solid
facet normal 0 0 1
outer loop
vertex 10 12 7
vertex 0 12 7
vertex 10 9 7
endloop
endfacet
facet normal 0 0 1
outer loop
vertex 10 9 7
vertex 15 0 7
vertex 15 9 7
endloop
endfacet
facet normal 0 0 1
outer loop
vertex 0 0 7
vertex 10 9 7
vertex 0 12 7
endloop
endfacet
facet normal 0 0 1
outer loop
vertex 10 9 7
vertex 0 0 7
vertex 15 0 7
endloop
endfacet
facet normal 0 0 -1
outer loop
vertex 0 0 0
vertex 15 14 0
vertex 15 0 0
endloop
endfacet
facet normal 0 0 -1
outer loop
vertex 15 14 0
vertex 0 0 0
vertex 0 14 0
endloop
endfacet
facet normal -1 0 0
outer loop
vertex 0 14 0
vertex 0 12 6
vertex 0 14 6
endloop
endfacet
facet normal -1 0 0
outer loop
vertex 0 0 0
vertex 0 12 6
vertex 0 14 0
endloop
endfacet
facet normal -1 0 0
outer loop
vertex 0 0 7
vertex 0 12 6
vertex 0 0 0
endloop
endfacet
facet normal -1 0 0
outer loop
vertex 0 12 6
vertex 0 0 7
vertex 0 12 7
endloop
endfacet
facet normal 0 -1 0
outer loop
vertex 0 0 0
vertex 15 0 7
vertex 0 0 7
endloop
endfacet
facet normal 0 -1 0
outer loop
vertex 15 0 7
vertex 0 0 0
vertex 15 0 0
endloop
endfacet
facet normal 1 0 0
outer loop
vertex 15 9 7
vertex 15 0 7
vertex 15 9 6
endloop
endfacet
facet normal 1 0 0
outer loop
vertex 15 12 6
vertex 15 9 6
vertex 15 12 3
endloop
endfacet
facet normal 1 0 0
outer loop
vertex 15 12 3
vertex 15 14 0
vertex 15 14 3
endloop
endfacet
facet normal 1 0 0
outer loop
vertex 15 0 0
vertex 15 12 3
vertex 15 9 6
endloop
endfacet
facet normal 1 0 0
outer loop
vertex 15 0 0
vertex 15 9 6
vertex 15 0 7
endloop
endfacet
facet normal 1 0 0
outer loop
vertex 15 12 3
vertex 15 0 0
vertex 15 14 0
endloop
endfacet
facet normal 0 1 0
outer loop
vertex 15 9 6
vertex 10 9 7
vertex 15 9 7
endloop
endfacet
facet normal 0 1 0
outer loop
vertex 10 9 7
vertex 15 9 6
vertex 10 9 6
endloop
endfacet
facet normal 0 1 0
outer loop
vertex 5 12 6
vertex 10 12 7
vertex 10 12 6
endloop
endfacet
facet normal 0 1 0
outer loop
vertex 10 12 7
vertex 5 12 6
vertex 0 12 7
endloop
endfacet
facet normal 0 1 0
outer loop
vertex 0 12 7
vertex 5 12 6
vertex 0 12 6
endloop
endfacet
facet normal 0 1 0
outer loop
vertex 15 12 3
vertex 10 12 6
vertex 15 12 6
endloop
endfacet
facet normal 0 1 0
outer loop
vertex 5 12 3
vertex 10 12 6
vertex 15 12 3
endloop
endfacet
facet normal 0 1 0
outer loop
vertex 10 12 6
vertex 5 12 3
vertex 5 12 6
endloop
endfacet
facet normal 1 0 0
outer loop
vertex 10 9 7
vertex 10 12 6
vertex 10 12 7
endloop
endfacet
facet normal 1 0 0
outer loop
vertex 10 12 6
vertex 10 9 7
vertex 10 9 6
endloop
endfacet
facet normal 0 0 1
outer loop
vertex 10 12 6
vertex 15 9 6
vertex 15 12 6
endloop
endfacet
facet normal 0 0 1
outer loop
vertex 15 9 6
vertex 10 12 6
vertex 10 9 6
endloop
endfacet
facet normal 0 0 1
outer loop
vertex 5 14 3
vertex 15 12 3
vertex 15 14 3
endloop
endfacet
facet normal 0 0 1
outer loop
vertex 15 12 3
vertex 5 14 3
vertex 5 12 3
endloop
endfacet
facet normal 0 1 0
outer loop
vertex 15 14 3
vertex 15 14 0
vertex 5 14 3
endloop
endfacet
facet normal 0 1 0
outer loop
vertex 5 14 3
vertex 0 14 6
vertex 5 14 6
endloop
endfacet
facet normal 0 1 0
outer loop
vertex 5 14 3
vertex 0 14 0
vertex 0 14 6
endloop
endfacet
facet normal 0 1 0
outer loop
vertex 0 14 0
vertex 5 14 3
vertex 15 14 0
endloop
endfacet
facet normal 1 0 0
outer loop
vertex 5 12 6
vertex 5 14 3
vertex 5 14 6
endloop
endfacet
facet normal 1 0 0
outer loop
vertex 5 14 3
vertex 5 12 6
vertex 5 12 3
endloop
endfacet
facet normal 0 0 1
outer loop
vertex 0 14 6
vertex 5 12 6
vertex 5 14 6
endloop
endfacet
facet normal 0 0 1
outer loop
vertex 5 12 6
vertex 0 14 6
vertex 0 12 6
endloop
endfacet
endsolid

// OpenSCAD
translate([2.5, 1.5, 3.5]) color([0.9043986330300443, 0.47021616129820465, 0.9023042315131579]) cube([5, 3, 7], center=true);
translate([7.5, 1.5, 3.5]) color([0.5697685418235108, 0.6976970707821888, 0.2034146857749588]) cube([5, 3, 7], center=true);
translate([12.5, 1.5, 3.5]) color([0.7673483420763234, 0.7886482900098098, 0.1582086298273846]) cube([5, 3, 7], center=true);
translate([2.5, 4.5, 3.5]) color([0.16195407019788421, 0.5294742230377147, 0.11721284387105246]) cube([5, 3, 7], center=true);
translate([7.5, 4.5, 3.5]) color([0.9214183944636138, 0.6656058220179341, 0.01320375853497835]) cube([5, 3, 7], center=true);
translate([12.5, 4.5, 3.5]) color([0.6812806756042346, 0.9000980523907597, 0.8748046942695984]) cube([5, 3, 7], center=true);
translate([2.5, 7.5, 3.5]) color([0.9175111227590292, 0.6489334878113245, 0.38864224283144744]) cube([5, 3, 7], center=true);
translate([7.5, 7.5, 3.5]) color([0.6576161999324908, 0.15341277093142425, 0.6908227578732097]) cube([5, 3, 7], center=true);
translate([12.5, 7.5, 3.5]) color([0.4579542036471842, 0.07907378923830799, 0.7390161160059011]) cube([5, 3, 7], center=true);
translate([2.5, 10.5, 3.5]) color([0.5443194976514814, 0.13483760684825774, 0.7621666562045316]) cube([5, 3, 7], center=true);
translate([7.5, 10.5, 3.5]) color([0.4818270828740713, 0.6101356542697393, 0.673403459483394]) cube([5, 3, 7], center=true);
translate([12.5, 10.5, 1.0]) color([0.5902776863195436, 0.8919435414206076, 0.8537743808409336]) cube([5, 3, 2], center=true);
translate([12.5, 10.5, 3.0]) color([0.1323442810447465, 0.3102975814641805, 0.7484858811975865]) cube([5, 3, 2], center=true);
translate([12.5, 10.5, 5.0]) color([0.8289027709575956, 0.08072310687247075, 0.594576926472109]) cube([5, 3, 2], center=true);
translate([2.5, 13.0, 1.5]) color([0.6985826889753467, 0.16007977902454107, 0.22309782085865282]) cube([5, 2, 3], center=true);
translate([7.5, 13.0, 1.5]) color([0.4481353266436462, 0.7103499760882809, 0.6737752003084974]) cube([5, 2, 3], center=true);
translate([12.5, 13.0, 1.5]) color([0.8745376498580455, 0.03154547812243602, 0.8716881923513831]) cube([5, 2, 3], center=true);
translate([2.5, 13.0, 4.5]) color([0.5674723417924832, 0.7721857179864934, 0.709006034186331]) cube([5, 2, 3], center=true);
